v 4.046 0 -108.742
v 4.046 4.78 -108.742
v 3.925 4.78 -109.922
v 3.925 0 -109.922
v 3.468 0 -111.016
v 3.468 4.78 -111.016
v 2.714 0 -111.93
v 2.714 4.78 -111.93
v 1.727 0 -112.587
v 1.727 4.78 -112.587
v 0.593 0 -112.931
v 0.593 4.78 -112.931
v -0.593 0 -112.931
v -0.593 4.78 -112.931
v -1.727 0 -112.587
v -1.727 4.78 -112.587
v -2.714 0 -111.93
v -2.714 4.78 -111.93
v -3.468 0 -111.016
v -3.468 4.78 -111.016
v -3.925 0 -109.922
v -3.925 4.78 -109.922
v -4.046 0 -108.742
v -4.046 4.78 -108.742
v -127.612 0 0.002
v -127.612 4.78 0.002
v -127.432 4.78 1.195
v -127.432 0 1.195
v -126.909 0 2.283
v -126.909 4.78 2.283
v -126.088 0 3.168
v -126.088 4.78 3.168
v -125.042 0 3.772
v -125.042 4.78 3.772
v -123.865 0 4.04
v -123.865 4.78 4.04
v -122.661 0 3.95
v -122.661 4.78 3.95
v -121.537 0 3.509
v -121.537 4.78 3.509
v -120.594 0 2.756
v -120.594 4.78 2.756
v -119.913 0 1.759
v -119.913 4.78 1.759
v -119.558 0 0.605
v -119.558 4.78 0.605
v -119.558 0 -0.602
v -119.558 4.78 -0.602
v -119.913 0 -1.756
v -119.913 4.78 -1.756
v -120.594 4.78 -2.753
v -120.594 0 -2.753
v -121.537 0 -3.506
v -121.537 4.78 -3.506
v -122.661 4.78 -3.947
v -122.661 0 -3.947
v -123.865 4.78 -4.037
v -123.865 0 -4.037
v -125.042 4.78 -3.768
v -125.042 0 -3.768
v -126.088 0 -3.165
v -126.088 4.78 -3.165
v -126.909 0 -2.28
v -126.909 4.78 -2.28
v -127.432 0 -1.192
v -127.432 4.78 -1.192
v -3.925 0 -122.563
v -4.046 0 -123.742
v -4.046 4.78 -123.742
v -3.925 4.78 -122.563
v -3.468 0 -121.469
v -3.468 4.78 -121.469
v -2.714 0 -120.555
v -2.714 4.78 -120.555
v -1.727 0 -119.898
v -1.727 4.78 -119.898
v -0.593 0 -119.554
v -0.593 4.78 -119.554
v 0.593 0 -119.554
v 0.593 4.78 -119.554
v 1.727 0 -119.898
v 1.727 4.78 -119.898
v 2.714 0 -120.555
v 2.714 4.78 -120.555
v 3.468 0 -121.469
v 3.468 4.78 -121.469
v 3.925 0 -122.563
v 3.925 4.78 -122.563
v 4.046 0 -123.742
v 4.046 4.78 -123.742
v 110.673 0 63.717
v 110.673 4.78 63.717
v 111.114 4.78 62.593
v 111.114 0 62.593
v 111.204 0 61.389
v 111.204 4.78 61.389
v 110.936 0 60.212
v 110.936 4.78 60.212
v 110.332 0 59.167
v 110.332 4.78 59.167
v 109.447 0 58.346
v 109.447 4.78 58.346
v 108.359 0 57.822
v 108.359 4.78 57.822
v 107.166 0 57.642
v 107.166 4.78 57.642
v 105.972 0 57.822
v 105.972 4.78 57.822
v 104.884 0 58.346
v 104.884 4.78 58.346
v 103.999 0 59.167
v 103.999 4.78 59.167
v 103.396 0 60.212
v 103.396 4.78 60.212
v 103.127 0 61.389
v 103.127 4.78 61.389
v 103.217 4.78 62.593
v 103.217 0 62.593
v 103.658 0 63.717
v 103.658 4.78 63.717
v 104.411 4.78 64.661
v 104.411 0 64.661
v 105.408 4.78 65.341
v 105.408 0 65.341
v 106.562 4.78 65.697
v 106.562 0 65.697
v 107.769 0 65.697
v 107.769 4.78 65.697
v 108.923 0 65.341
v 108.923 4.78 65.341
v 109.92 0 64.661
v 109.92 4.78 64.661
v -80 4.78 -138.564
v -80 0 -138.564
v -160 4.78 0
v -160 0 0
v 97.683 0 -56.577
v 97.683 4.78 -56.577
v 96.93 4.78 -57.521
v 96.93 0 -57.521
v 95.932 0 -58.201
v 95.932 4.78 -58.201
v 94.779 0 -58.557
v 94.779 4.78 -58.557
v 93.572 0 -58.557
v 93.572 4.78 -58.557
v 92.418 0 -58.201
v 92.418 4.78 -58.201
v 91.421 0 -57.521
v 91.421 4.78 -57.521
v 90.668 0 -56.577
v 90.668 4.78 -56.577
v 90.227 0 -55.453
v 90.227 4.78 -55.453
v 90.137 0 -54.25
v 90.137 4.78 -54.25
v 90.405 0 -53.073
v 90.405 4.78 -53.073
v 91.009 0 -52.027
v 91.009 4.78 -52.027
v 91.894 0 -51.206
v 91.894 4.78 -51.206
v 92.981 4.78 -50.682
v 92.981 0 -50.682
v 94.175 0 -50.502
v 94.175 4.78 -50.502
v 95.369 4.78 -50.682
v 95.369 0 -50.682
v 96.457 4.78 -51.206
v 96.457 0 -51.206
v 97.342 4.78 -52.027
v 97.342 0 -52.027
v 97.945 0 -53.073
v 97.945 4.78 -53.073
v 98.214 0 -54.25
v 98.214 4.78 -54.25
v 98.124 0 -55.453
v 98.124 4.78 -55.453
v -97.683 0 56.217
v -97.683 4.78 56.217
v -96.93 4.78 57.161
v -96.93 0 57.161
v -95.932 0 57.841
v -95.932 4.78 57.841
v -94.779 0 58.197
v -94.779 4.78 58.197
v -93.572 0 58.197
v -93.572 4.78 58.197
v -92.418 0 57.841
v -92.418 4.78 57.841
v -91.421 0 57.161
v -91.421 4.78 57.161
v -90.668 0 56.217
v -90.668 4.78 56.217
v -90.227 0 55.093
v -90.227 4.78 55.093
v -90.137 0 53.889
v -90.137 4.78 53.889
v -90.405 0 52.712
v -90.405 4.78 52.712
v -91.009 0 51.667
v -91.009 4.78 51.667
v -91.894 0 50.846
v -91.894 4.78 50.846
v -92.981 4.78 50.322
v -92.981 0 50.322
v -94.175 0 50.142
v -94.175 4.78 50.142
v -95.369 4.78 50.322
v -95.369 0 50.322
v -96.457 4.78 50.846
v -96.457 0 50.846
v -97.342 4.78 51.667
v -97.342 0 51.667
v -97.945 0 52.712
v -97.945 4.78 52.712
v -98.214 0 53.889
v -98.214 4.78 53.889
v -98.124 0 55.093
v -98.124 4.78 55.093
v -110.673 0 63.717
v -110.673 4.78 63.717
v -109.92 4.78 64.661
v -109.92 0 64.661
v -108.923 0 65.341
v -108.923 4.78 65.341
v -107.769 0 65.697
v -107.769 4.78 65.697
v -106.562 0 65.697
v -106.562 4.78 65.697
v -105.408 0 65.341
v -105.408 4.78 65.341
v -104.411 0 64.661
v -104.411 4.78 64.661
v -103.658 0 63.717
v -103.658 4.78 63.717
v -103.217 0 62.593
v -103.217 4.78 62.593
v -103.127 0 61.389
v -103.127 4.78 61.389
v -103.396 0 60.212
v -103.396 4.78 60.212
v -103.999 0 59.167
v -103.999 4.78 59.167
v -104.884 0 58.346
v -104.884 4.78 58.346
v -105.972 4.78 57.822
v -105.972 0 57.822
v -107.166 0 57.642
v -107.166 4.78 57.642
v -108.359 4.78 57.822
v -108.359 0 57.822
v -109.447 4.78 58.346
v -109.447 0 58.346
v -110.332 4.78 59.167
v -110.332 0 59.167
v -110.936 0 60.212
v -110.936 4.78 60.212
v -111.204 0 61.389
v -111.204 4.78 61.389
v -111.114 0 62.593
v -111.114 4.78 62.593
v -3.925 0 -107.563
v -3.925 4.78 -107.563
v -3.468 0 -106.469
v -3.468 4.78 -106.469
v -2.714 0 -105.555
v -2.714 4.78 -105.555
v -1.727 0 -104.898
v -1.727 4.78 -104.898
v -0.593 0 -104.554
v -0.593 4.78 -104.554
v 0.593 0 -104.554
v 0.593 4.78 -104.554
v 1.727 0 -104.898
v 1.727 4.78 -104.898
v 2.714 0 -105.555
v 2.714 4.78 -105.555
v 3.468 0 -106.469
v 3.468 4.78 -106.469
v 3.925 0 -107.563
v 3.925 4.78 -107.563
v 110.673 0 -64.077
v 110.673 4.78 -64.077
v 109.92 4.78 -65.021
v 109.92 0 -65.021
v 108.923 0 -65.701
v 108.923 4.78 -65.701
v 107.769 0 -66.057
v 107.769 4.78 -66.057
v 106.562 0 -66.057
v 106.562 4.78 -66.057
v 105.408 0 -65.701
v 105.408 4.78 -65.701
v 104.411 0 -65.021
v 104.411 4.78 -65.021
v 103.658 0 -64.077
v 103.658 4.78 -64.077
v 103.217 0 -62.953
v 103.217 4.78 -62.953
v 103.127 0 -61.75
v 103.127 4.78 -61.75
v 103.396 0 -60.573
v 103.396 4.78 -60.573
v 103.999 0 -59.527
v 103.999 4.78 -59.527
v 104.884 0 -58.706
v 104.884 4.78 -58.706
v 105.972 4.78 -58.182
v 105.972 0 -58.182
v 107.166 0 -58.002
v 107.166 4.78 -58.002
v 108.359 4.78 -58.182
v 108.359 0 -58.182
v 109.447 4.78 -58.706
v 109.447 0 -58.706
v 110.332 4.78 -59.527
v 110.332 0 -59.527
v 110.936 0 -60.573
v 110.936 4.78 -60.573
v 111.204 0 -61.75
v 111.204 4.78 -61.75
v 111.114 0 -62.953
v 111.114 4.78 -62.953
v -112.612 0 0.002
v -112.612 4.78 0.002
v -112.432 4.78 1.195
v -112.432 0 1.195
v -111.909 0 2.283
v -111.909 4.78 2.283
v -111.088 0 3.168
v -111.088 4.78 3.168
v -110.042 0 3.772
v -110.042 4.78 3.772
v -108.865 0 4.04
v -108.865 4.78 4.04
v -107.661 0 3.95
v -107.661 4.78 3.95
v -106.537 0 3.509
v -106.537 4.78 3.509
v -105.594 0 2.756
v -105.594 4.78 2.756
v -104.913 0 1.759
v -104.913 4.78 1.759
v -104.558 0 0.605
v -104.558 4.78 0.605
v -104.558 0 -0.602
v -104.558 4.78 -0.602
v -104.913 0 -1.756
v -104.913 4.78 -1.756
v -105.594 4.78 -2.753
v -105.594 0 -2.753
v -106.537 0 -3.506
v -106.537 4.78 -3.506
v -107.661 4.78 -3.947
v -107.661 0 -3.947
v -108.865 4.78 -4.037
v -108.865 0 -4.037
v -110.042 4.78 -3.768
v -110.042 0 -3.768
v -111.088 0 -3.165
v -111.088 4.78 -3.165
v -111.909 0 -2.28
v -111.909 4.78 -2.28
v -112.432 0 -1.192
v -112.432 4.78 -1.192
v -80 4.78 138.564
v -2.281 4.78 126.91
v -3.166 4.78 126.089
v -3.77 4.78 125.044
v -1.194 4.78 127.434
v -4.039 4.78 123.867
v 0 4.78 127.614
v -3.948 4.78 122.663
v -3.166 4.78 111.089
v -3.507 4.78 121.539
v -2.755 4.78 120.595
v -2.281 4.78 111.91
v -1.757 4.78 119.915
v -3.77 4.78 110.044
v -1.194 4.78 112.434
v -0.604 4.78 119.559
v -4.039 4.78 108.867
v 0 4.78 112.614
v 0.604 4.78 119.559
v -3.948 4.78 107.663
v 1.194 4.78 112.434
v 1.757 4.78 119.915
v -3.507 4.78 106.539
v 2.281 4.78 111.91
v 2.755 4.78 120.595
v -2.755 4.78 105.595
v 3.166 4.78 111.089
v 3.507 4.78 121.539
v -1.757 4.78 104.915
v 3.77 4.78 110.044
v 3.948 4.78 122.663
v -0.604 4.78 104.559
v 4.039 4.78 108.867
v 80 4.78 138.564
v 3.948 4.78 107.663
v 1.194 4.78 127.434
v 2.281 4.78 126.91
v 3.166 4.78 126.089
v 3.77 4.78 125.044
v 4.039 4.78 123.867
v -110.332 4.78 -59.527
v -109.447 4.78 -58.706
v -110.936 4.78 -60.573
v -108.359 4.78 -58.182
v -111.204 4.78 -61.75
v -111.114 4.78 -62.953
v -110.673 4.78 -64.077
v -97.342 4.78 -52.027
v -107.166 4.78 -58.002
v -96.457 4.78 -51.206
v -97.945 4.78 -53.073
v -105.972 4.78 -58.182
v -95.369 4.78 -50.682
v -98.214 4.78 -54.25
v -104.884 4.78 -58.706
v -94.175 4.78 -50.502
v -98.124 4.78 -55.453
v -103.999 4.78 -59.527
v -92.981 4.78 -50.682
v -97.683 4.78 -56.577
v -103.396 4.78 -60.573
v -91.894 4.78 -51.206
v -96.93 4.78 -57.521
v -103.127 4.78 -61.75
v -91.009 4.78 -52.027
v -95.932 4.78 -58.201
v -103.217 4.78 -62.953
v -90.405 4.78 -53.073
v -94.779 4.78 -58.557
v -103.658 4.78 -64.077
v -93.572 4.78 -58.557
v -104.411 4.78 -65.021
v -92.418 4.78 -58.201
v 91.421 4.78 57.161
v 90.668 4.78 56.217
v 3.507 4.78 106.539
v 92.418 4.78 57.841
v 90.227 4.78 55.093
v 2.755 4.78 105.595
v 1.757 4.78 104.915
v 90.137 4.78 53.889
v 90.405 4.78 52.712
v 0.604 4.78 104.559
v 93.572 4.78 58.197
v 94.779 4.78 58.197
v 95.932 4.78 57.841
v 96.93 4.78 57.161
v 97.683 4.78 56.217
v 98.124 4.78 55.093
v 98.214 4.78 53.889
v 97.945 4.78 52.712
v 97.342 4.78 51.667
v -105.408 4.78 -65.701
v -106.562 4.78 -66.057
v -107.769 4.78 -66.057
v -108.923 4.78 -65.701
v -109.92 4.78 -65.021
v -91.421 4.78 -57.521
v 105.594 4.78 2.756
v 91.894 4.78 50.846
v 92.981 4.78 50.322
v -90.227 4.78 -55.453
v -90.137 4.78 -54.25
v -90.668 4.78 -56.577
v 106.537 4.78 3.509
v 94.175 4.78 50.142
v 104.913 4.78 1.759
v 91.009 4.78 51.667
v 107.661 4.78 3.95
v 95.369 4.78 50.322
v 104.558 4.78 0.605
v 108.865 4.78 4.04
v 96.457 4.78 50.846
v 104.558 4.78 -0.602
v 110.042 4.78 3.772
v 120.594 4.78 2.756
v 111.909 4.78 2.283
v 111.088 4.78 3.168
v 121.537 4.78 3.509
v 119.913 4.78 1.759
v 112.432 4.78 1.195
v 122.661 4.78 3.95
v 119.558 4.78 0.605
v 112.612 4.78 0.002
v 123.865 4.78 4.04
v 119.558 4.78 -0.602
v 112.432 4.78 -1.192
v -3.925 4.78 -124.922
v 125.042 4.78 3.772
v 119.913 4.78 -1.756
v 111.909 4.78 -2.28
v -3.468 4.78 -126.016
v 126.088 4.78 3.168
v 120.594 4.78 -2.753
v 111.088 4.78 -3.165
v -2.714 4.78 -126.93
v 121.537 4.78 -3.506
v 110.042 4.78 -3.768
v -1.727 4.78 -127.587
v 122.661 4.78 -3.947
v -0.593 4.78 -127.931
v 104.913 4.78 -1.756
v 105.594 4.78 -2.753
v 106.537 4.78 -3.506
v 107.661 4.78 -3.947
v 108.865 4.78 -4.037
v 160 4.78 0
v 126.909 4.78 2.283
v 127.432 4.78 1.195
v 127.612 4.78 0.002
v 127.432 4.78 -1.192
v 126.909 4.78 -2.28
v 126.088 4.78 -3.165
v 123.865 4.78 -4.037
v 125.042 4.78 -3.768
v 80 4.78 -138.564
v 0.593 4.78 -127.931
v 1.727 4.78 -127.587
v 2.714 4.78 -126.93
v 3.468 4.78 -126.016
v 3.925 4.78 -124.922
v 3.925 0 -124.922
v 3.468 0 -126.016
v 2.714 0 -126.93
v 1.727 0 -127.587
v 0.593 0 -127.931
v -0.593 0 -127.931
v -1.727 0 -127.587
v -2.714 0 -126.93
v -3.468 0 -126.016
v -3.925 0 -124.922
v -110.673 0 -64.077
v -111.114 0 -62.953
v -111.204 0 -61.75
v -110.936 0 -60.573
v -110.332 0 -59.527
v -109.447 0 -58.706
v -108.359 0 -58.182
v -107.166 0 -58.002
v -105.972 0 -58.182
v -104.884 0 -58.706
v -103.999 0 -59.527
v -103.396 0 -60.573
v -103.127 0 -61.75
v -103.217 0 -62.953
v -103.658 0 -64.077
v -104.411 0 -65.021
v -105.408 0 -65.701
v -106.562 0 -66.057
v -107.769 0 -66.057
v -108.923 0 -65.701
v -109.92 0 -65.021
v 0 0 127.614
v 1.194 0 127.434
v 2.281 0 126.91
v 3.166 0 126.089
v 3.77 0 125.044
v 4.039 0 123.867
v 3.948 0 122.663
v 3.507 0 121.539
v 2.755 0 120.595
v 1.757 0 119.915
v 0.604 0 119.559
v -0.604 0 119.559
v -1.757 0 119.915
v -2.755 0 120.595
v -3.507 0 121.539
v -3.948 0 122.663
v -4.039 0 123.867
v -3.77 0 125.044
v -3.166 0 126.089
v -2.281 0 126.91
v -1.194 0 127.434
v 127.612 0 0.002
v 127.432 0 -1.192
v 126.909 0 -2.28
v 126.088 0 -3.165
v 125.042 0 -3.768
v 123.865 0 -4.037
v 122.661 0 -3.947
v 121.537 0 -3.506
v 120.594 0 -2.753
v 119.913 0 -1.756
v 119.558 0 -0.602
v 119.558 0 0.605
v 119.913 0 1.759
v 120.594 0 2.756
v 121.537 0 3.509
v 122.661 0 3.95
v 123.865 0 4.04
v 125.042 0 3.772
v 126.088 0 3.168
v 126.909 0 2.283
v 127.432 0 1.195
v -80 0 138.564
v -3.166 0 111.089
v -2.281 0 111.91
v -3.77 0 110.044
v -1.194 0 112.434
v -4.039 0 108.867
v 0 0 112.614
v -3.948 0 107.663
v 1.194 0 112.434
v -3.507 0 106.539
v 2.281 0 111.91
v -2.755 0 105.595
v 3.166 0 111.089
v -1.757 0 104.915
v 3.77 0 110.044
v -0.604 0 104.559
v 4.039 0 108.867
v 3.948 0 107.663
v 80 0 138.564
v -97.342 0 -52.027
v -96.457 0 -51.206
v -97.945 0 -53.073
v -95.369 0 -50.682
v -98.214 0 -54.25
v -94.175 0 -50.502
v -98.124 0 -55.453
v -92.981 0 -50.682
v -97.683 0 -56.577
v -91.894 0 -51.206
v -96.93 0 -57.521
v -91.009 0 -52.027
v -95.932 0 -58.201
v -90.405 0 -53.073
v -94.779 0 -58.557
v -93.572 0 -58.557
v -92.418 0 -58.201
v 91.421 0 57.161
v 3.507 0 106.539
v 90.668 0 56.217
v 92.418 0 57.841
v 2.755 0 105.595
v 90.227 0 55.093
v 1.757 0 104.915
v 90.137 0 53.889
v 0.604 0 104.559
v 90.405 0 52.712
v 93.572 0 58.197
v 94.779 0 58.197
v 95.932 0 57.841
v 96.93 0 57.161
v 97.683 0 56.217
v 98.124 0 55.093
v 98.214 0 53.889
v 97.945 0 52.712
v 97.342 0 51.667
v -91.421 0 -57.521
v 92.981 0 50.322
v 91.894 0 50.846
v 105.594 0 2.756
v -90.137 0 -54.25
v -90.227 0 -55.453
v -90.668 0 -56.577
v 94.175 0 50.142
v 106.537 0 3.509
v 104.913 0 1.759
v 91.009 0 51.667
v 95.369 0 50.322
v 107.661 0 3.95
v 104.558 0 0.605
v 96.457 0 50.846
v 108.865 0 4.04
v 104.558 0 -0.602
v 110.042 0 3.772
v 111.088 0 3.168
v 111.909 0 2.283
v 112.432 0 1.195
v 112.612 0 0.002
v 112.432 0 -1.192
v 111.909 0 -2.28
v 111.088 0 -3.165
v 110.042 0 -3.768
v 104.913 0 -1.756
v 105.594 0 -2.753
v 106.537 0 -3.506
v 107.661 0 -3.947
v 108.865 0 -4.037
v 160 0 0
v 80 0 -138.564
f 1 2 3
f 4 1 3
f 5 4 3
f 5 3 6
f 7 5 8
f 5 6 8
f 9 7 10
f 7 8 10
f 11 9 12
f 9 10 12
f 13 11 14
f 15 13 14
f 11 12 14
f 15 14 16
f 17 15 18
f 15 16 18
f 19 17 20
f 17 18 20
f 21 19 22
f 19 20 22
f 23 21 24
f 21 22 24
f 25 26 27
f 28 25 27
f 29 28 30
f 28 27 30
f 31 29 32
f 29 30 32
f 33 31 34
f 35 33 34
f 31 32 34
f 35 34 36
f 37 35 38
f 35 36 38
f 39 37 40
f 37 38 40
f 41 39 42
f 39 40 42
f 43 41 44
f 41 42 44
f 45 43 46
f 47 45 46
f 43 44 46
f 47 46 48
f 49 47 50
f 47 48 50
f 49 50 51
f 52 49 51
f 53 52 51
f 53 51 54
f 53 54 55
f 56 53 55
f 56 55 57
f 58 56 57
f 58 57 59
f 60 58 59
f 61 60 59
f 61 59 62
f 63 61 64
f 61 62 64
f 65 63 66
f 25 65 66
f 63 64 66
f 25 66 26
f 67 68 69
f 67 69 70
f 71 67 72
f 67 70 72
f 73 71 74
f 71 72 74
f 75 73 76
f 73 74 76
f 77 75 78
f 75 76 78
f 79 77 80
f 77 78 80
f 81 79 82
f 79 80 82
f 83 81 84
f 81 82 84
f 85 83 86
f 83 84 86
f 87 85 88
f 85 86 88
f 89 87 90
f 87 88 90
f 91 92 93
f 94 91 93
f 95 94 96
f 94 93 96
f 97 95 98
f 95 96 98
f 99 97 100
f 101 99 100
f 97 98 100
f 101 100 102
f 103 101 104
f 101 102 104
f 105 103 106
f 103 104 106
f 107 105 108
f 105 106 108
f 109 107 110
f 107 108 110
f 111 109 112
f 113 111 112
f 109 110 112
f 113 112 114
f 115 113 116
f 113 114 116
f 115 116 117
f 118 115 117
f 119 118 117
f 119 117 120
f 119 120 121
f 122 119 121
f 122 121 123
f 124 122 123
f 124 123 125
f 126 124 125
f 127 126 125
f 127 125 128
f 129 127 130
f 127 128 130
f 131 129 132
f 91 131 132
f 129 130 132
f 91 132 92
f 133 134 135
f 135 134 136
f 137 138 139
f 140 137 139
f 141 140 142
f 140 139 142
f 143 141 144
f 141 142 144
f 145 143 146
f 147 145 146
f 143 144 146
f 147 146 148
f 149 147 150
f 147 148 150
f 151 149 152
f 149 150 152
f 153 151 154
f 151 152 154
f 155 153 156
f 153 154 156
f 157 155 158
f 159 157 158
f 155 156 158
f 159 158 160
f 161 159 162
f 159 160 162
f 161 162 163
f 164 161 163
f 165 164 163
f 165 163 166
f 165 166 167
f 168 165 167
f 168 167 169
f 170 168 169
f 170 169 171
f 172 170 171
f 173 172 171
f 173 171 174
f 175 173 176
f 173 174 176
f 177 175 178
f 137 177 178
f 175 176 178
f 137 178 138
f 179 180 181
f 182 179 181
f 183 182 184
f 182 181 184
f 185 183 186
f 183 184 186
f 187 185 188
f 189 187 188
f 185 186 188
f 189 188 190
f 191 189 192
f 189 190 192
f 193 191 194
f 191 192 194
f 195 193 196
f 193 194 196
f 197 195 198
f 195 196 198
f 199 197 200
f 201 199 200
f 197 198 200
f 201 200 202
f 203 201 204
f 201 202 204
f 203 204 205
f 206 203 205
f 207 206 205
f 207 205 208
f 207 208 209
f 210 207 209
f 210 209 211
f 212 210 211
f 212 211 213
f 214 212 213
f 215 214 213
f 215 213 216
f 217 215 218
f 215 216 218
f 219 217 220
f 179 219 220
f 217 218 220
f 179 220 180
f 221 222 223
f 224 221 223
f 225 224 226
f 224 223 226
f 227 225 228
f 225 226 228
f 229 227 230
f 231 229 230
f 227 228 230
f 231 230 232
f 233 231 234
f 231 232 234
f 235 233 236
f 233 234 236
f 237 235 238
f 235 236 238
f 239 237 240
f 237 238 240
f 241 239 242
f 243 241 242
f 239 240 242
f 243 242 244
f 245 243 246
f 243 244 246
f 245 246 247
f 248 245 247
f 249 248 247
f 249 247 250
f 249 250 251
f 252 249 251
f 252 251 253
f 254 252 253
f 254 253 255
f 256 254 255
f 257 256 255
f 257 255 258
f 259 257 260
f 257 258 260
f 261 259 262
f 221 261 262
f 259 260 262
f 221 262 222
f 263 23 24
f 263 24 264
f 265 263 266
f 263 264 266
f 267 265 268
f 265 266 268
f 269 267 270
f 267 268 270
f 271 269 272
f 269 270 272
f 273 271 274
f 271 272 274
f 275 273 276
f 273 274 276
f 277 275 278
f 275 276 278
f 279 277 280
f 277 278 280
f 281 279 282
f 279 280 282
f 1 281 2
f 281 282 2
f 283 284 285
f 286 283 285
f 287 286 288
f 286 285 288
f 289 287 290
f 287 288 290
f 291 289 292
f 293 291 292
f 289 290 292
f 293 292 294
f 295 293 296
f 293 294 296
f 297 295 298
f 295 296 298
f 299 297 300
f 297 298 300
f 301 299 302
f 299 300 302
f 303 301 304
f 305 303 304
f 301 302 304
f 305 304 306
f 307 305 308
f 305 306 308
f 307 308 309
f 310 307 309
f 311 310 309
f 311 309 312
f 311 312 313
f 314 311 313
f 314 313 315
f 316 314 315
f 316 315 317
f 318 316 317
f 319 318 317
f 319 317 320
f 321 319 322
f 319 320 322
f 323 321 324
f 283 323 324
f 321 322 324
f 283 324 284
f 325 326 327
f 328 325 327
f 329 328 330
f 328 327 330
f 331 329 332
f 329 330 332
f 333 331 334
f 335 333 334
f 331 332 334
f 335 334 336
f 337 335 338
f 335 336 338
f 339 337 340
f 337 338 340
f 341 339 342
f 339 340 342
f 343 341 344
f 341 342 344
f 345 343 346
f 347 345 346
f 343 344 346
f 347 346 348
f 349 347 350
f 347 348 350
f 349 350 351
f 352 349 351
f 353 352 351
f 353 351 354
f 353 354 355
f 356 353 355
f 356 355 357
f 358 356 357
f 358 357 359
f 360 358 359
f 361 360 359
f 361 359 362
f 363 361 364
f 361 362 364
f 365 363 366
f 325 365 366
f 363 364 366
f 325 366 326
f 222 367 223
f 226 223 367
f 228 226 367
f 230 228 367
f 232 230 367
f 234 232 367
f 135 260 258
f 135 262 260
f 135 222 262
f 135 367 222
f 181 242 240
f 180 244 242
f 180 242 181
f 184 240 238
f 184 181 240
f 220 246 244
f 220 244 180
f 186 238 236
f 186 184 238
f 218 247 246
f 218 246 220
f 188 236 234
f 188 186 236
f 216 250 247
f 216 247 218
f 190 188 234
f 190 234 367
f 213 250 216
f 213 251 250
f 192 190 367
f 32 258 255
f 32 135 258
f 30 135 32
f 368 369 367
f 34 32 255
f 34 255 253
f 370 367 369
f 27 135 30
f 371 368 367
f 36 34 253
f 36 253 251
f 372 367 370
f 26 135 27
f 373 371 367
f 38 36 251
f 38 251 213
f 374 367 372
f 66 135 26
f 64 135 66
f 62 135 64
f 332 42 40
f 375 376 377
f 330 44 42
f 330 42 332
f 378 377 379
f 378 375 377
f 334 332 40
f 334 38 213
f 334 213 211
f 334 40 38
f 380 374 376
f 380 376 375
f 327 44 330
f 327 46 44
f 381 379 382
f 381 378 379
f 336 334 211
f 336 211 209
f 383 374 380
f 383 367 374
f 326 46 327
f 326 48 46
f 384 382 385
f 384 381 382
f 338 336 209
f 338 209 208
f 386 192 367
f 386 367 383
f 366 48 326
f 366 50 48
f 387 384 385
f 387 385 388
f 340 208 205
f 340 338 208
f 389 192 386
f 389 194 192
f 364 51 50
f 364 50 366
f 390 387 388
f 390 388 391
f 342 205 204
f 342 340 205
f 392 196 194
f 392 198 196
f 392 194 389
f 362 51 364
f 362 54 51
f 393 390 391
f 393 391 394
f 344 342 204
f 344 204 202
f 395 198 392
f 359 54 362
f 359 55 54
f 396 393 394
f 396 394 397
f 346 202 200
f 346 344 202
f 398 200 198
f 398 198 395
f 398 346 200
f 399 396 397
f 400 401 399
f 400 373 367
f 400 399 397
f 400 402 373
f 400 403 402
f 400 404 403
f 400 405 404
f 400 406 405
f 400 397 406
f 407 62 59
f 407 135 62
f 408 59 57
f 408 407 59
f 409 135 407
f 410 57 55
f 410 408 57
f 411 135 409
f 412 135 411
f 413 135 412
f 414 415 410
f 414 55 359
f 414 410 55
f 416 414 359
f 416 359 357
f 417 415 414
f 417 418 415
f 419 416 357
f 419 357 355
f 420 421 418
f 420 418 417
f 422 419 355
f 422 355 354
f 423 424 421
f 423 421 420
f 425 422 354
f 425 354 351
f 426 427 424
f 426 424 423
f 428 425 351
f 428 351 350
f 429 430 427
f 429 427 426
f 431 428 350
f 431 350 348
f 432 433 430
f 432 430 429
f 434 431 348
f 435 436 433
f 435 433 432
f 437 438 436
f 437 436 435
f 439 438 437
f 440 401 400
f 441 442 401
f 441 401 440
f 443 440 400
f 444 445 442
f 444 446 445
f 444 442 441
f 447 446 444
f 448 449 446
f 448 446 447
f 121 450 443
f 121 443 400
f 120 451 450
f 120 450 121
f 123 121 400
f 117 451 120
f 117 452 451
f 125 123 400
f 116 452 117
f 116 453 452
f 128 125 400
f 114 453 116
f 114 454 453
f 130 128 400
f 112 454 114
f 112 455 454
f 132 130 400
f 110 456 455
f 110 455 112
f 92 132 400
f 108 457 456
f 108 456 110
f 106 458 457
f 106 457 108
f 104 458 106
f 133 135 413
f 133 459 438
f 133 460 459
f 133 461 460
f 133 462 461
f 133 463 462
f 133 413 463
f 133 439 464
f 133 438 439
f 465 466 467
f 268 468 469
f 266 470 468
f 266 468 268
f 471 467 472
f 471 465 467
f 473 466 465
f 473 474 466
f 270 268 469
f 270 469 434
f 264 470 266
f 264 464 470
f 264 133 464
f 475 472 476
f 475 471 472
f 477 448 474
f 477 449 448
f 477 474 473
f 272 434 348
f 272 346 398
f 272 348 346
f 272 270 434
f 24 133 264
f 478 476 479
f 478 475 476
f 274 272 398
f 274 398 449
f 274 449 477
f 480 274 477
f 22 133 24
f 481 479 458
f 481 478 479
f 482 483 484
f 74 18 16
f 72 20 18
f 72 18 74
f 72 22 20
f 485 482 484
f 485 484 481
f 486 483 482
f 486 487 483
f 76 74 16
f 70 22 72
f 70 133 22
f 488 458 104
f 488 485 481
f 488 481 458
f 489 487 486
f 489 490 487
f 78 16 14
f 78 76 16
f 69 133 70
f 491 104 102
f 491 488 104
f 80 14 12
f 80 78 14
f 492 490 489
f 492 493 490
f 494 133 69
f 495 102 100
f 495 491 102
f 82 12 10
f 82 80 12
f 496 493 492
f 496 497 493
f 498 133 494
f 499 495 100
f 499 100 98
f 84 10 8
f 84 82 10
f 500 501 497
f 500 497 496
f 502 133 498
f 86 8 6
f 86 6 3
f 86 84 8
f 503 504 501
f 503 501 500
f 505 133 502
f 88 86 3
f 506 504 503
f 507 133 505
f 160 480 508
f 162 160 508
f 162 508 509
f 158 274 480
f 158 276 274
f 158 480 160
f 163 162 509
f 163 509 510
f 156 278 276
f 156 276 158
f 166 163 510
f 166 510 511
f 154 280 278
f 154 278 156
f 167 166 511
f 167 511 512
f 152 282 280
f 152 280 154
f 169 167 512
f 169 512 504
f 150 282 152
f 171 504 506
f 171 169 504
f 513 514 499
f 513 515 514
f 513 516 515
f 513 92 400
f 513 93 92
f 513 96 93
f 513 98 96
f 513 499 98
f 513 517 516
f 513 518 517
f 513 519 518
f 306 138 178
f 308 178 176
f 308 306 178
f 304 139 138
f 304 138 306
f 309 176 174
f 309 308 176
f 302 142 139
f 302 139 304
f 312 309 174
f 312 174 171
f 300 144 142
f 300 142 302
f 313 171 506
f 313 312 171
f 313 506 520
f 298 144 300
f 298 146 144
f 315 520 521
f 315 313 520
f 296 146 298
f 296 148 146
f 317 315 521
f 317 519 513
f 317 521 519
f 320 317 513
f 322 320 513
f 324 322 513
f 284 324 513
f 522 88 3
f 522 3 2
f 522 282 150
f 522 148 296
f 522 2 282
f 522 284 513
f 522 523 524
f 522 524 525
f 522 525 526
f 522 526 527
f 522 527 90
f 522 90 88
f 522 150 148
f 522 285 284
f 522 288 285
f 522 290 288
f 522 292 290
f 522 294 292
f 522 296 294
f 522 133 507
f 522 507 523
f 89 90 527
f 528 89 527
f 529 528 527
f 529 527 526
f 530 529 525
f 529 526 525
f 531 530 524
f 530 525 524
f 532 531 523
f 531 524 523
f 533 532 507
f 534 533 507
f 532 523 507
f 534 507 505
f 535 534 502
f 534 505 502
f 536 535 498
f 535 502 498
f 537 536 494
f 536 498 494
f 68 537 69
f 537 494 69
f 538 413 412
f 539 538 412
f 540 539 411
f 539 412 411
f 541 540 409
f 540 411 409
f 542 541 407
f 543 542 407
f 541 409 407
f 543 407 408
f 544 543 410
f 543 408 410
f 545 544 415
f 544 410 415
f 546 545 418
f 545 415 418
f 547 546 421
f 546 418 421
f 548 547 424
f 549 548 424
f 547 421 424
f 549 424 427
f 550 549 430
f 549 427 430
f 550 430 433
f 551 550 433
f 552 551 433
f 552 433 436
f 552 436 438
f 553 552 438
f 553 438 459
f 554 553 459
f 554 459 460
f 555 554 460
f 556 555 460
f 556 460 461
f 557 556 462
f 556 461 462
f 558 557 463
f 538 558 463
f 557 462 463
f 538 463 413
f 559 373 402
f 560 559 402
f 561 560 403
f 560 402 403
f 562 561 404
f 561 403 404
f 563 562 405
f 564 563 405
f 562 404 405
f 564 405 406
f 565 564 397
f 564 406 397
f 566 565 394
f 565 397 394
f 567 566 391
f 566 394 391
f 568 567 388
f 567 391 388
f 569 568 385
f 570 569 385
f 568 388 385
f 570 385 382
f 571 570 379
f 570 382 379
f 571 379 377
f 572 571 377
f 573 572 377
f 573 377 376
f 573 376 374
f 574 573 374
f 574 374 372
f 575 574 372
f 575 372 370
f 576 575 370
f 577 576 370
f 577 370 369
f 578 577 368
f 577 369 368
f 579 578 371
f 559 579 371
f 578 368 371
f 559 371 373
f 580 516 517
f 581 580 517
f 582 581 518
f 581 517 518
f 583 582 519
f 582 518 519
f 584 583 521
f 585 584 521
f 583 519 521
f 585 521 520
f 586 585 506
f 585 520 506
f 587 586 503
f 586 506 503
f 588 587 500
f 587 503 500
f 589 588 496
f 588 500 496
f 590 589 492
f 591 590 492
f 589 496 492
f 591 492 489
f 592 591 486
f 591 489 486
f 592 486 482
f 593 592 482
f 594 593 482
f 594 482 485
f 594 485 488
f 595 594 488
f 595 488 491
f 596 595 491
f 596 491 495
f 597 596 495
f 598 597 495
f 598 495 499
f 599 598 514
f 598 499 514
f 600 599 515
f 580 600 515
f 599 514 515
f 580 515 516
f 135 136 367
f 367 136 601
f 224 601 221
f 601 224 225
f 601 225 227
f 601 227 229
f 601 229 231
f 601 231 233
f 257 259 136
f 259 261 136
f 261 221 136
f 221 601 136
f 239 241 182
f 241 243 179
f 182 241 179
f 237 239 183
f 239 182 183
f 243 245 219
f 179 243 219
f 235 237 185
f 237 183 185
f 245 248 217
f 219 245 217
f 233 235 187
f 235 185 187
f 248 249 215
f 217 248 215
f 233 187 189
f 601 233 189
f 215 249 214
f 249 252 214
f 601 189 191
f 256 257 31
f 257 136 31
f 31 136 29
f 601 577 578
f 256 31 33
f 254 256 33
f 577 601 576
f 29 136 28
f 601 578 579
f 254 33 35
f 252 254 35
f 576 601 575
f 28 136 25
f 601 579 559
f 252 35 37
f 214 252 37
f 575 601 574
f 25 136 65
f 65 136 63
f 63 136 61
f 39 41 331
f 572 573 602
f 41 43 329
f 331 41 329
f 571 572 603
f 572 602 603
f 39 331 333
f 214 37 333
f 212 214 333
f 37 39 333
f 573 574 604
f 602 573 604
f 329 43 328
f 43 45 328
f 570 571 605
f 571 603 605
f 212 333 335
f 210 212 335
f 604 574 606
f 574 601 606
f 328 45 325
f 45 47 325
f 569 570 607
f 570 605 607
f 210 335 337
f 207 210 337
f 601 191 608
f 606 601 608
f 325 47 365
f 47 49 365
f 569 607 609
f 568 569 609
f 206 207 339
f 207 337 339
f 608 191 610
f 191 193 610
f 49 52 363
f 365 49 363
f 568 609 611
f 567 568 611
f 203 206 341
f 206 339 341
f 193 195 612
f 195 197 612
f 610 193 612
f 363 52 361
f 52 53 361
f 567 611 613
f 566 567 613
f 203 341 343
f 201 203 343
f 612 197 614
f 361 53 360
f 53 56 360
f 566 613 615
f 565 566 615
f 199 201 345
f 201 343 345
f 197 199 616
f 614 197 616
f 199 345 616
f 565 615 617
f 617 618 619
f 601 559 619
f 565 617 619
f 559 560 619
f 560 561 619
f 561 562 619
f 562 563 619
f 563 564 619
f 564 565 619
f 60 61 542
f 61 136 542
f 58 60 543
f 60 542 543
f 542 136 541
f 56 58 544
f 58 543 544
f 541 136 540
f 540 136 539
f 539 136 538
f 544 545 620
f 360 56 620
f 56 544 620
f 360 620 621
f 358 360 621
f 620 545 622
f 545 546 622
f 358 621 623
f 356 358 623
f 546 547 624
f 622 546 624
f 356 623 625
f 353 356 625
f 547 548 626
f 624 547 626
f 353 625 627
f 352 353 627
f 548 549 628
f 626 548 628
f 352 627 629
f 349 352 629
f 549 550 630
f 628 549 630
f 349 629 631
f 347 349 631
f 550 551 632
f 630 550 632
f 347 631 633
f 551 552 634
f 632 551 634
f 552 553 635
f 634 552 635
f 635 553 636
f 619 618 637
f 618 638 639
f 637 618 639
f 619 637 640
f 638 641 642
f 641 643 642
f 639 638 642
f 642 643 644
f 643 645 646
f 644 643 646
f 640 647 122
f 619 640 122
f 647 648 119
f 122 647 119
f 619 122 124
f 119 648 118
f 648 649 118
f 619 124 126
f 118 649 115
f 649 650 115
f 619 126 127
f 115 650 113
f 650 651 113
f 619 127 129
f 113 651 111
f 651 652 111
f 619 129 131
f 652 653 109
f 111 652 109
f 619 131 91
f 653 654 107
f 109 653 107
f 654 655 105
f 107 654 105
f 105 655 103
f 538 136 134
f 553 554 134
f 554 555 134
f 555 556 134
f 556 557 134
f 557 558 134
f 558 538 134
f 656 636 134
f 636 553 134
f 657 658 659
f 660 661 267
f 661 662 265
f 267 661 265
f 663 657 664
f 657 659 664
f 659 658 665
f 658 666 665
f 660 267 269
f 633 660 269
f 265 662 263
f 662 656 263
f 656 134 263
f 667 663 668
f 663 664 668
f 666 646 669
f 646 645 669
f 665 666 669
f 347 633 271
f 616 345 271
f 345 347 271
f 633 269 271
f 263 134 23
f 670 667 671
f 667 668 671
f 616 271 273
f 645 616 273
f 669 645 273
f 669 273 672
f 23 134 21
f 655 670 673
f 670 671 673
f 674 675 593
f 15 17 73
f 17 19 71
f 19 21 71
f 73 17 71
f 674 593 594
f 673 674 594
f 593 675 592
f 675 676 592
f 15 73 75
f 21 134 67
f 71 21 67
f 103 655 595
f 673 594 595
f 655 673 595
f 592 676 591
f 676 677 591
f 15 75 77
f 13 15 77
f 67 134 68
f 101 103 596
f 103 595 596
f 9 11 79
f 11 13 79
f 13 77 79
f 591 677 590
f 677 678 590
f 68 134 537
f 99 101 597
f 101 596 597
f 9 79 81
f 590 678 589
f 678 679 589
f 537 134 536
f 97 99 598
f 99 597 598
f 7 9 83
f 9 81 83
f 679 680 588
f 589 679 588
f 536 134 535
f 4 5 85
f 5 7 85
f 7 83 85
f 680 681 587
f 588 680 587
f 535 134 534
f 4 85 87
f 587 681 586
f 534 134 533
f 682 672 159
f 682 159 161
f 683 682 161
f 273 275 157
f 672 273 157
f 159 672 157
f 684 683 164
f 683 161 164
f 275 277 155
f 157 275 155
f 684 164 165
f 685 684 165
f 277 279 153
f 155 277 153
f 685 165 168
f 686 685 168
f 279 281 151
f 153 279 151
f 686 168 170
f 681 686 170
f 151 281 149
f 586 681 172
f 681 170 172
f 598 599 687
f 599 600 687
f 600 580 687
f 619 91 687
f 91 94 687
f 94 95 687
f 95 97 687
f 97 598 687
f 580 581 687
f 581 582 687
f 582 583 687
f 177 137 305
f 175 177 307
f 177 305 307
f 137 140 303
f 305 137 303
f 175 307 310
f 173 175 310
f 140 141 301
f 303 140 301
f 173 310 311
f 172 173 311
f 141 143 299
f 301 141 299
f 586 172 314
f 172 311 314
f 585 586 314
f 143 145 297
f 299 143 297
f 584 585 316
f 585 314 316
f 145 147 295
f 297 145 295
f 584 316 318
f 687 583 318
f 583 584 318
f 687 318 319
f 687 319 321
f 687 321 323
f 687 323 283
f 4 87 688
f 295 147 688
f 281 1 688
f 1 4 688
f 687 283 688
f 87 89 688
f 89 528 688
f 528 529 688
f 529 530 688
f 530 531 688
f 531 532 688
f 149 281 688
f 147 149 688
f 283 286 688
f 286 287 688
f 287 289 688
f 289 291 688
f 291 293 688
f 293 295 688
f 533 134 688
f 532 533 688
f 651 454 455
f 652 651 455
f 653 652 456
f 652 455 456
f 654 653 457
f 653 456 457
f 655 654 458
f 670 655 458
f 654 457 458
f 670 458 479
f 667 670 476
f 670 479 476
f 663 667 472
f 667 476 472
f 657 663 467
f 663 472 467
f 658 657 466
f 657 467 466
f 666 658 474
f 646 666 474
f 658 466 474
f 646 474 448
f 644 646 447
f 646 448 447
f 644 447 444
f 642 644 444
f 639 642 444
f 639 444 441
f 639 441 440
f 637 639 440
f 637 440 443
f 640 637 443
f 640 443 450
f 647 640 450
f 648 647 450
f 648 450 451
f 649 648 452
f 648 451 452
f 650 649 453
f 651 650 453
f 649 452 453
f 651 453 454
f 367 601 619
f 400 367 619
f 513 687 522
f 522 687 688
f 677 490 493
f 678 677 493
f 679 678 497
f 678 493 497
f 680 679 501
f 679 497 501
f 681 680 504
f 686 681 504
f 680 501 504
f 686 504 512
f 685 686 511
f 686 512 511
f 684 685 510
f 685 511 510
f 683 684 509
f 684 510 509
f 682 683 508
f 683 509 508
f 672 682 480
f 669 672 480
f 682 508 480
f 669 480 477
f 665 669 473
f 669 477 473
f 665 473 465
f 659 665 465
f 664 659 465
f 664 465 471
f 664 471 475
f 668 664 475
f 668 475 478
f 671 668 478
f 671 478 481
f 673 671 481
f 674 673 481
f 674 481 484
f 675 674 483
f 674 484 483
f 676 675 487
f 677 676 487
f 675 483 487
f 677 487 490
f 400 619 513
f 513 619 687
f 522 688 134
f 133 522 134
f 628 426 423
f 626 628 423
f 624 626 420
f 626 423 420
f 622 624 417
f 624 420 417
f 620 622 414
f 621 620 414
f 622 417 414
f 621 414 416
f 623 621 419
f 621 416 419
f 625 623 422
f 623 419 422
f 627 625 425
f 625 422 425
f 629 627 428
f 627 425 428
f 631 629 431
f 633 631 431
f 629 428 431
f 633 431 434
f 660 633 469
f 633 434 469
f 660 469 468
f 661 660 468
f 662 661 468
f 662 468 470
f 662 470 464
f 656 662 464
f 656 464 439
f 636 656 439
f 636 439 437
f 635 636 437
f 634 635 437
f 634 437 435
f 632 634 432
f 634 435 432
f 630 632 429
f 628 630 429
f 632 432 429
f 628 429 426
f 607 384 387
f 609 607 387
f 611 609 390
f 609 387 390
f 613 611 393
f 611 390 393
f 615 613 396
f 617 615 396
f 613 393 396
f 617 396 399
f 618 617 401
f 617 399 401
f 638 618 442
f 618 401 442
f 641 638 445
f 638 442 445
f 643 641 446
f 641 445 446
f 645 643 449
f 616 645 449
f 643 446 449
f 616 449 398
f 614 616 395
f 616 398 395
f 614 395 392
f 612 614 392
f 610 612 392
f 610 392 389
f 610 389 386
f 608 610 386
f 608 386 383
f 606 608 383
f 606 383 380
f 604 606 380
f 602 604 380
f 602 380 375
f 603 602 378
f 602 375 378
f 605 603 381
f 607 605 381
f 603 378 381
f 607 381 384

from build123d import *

# Parameters (mm, degrees)
BOSS_EXTRUDE1_DEPTH = 4.78
SKETCH2_R           = 4.05
CUT_EXTRUDE1_DEPTH  = 4.78
CIRPATTERN1_COUNT   = 6
CIRPATTERN2_COUNT   = 4


with BuildPart() as part:
    # Sketch1 → Boss-Extrude1 (new body)
    with BuildSketch(Plane(origin=(0, 0, 0), x_dir=(1, 0, 0), z_dir=(0, 1, 0))):
        Polygon((160, 0), (80, 138.564064606), (-80, 138.564064606), (-160, 0), (-80, -138.564064606), (80, -138.564064606), align=None)
    extrude(amount=BOSS_EXTRUDE1_DEPTH)

    # Sketch2 → Cut-Extrude1 (cut)
    with BuildSketch(Plane(origin=(0, 4.78, 0), x_dir=(1, 0, 0), z_dir=(0, 1, 0))):
        with Locations(Location((0, -123.564064606, 0), (0, 0, 270))):
            Circle(SKETCH2_R)
        with Locations(Location((0, -108.564064606, 0), (0, 0, 270))):
            Circle(SKETCH2_R)
    cut_extrude1 = extrude(amount=-CUT_EXTRUDE1_DEPTH, mode=Mode.SUBTRACT)

    # CirPattern1: Cut-Extrude1 ×6 about axis
    cirpattern1_axis = Axis((0, 0, -0.180123057), (0, 1, 0))
    for i in range(1, CIRPATTERN1_COUNT):
        add(cut_extrude1.rotate(cirpattern1_axis, i * 360 / CIRPATTERN1_COUNT), mode=Mode.SUBTRACT)

    # CirPattern2: Cut-Extrude1 ×4 about axis
    cirpattern2_axis = Axis((0, 0, 0.001690344), (0, 1, 0))
    for i in range(1, CIRPATTERN2_COUNT):
        add(cut_extrude1.rotate(cirpattern2_axis, i * 360 / CIRPATTERN2_COUNT), mode=Mode.SUBTRACT)


solid = part.part
